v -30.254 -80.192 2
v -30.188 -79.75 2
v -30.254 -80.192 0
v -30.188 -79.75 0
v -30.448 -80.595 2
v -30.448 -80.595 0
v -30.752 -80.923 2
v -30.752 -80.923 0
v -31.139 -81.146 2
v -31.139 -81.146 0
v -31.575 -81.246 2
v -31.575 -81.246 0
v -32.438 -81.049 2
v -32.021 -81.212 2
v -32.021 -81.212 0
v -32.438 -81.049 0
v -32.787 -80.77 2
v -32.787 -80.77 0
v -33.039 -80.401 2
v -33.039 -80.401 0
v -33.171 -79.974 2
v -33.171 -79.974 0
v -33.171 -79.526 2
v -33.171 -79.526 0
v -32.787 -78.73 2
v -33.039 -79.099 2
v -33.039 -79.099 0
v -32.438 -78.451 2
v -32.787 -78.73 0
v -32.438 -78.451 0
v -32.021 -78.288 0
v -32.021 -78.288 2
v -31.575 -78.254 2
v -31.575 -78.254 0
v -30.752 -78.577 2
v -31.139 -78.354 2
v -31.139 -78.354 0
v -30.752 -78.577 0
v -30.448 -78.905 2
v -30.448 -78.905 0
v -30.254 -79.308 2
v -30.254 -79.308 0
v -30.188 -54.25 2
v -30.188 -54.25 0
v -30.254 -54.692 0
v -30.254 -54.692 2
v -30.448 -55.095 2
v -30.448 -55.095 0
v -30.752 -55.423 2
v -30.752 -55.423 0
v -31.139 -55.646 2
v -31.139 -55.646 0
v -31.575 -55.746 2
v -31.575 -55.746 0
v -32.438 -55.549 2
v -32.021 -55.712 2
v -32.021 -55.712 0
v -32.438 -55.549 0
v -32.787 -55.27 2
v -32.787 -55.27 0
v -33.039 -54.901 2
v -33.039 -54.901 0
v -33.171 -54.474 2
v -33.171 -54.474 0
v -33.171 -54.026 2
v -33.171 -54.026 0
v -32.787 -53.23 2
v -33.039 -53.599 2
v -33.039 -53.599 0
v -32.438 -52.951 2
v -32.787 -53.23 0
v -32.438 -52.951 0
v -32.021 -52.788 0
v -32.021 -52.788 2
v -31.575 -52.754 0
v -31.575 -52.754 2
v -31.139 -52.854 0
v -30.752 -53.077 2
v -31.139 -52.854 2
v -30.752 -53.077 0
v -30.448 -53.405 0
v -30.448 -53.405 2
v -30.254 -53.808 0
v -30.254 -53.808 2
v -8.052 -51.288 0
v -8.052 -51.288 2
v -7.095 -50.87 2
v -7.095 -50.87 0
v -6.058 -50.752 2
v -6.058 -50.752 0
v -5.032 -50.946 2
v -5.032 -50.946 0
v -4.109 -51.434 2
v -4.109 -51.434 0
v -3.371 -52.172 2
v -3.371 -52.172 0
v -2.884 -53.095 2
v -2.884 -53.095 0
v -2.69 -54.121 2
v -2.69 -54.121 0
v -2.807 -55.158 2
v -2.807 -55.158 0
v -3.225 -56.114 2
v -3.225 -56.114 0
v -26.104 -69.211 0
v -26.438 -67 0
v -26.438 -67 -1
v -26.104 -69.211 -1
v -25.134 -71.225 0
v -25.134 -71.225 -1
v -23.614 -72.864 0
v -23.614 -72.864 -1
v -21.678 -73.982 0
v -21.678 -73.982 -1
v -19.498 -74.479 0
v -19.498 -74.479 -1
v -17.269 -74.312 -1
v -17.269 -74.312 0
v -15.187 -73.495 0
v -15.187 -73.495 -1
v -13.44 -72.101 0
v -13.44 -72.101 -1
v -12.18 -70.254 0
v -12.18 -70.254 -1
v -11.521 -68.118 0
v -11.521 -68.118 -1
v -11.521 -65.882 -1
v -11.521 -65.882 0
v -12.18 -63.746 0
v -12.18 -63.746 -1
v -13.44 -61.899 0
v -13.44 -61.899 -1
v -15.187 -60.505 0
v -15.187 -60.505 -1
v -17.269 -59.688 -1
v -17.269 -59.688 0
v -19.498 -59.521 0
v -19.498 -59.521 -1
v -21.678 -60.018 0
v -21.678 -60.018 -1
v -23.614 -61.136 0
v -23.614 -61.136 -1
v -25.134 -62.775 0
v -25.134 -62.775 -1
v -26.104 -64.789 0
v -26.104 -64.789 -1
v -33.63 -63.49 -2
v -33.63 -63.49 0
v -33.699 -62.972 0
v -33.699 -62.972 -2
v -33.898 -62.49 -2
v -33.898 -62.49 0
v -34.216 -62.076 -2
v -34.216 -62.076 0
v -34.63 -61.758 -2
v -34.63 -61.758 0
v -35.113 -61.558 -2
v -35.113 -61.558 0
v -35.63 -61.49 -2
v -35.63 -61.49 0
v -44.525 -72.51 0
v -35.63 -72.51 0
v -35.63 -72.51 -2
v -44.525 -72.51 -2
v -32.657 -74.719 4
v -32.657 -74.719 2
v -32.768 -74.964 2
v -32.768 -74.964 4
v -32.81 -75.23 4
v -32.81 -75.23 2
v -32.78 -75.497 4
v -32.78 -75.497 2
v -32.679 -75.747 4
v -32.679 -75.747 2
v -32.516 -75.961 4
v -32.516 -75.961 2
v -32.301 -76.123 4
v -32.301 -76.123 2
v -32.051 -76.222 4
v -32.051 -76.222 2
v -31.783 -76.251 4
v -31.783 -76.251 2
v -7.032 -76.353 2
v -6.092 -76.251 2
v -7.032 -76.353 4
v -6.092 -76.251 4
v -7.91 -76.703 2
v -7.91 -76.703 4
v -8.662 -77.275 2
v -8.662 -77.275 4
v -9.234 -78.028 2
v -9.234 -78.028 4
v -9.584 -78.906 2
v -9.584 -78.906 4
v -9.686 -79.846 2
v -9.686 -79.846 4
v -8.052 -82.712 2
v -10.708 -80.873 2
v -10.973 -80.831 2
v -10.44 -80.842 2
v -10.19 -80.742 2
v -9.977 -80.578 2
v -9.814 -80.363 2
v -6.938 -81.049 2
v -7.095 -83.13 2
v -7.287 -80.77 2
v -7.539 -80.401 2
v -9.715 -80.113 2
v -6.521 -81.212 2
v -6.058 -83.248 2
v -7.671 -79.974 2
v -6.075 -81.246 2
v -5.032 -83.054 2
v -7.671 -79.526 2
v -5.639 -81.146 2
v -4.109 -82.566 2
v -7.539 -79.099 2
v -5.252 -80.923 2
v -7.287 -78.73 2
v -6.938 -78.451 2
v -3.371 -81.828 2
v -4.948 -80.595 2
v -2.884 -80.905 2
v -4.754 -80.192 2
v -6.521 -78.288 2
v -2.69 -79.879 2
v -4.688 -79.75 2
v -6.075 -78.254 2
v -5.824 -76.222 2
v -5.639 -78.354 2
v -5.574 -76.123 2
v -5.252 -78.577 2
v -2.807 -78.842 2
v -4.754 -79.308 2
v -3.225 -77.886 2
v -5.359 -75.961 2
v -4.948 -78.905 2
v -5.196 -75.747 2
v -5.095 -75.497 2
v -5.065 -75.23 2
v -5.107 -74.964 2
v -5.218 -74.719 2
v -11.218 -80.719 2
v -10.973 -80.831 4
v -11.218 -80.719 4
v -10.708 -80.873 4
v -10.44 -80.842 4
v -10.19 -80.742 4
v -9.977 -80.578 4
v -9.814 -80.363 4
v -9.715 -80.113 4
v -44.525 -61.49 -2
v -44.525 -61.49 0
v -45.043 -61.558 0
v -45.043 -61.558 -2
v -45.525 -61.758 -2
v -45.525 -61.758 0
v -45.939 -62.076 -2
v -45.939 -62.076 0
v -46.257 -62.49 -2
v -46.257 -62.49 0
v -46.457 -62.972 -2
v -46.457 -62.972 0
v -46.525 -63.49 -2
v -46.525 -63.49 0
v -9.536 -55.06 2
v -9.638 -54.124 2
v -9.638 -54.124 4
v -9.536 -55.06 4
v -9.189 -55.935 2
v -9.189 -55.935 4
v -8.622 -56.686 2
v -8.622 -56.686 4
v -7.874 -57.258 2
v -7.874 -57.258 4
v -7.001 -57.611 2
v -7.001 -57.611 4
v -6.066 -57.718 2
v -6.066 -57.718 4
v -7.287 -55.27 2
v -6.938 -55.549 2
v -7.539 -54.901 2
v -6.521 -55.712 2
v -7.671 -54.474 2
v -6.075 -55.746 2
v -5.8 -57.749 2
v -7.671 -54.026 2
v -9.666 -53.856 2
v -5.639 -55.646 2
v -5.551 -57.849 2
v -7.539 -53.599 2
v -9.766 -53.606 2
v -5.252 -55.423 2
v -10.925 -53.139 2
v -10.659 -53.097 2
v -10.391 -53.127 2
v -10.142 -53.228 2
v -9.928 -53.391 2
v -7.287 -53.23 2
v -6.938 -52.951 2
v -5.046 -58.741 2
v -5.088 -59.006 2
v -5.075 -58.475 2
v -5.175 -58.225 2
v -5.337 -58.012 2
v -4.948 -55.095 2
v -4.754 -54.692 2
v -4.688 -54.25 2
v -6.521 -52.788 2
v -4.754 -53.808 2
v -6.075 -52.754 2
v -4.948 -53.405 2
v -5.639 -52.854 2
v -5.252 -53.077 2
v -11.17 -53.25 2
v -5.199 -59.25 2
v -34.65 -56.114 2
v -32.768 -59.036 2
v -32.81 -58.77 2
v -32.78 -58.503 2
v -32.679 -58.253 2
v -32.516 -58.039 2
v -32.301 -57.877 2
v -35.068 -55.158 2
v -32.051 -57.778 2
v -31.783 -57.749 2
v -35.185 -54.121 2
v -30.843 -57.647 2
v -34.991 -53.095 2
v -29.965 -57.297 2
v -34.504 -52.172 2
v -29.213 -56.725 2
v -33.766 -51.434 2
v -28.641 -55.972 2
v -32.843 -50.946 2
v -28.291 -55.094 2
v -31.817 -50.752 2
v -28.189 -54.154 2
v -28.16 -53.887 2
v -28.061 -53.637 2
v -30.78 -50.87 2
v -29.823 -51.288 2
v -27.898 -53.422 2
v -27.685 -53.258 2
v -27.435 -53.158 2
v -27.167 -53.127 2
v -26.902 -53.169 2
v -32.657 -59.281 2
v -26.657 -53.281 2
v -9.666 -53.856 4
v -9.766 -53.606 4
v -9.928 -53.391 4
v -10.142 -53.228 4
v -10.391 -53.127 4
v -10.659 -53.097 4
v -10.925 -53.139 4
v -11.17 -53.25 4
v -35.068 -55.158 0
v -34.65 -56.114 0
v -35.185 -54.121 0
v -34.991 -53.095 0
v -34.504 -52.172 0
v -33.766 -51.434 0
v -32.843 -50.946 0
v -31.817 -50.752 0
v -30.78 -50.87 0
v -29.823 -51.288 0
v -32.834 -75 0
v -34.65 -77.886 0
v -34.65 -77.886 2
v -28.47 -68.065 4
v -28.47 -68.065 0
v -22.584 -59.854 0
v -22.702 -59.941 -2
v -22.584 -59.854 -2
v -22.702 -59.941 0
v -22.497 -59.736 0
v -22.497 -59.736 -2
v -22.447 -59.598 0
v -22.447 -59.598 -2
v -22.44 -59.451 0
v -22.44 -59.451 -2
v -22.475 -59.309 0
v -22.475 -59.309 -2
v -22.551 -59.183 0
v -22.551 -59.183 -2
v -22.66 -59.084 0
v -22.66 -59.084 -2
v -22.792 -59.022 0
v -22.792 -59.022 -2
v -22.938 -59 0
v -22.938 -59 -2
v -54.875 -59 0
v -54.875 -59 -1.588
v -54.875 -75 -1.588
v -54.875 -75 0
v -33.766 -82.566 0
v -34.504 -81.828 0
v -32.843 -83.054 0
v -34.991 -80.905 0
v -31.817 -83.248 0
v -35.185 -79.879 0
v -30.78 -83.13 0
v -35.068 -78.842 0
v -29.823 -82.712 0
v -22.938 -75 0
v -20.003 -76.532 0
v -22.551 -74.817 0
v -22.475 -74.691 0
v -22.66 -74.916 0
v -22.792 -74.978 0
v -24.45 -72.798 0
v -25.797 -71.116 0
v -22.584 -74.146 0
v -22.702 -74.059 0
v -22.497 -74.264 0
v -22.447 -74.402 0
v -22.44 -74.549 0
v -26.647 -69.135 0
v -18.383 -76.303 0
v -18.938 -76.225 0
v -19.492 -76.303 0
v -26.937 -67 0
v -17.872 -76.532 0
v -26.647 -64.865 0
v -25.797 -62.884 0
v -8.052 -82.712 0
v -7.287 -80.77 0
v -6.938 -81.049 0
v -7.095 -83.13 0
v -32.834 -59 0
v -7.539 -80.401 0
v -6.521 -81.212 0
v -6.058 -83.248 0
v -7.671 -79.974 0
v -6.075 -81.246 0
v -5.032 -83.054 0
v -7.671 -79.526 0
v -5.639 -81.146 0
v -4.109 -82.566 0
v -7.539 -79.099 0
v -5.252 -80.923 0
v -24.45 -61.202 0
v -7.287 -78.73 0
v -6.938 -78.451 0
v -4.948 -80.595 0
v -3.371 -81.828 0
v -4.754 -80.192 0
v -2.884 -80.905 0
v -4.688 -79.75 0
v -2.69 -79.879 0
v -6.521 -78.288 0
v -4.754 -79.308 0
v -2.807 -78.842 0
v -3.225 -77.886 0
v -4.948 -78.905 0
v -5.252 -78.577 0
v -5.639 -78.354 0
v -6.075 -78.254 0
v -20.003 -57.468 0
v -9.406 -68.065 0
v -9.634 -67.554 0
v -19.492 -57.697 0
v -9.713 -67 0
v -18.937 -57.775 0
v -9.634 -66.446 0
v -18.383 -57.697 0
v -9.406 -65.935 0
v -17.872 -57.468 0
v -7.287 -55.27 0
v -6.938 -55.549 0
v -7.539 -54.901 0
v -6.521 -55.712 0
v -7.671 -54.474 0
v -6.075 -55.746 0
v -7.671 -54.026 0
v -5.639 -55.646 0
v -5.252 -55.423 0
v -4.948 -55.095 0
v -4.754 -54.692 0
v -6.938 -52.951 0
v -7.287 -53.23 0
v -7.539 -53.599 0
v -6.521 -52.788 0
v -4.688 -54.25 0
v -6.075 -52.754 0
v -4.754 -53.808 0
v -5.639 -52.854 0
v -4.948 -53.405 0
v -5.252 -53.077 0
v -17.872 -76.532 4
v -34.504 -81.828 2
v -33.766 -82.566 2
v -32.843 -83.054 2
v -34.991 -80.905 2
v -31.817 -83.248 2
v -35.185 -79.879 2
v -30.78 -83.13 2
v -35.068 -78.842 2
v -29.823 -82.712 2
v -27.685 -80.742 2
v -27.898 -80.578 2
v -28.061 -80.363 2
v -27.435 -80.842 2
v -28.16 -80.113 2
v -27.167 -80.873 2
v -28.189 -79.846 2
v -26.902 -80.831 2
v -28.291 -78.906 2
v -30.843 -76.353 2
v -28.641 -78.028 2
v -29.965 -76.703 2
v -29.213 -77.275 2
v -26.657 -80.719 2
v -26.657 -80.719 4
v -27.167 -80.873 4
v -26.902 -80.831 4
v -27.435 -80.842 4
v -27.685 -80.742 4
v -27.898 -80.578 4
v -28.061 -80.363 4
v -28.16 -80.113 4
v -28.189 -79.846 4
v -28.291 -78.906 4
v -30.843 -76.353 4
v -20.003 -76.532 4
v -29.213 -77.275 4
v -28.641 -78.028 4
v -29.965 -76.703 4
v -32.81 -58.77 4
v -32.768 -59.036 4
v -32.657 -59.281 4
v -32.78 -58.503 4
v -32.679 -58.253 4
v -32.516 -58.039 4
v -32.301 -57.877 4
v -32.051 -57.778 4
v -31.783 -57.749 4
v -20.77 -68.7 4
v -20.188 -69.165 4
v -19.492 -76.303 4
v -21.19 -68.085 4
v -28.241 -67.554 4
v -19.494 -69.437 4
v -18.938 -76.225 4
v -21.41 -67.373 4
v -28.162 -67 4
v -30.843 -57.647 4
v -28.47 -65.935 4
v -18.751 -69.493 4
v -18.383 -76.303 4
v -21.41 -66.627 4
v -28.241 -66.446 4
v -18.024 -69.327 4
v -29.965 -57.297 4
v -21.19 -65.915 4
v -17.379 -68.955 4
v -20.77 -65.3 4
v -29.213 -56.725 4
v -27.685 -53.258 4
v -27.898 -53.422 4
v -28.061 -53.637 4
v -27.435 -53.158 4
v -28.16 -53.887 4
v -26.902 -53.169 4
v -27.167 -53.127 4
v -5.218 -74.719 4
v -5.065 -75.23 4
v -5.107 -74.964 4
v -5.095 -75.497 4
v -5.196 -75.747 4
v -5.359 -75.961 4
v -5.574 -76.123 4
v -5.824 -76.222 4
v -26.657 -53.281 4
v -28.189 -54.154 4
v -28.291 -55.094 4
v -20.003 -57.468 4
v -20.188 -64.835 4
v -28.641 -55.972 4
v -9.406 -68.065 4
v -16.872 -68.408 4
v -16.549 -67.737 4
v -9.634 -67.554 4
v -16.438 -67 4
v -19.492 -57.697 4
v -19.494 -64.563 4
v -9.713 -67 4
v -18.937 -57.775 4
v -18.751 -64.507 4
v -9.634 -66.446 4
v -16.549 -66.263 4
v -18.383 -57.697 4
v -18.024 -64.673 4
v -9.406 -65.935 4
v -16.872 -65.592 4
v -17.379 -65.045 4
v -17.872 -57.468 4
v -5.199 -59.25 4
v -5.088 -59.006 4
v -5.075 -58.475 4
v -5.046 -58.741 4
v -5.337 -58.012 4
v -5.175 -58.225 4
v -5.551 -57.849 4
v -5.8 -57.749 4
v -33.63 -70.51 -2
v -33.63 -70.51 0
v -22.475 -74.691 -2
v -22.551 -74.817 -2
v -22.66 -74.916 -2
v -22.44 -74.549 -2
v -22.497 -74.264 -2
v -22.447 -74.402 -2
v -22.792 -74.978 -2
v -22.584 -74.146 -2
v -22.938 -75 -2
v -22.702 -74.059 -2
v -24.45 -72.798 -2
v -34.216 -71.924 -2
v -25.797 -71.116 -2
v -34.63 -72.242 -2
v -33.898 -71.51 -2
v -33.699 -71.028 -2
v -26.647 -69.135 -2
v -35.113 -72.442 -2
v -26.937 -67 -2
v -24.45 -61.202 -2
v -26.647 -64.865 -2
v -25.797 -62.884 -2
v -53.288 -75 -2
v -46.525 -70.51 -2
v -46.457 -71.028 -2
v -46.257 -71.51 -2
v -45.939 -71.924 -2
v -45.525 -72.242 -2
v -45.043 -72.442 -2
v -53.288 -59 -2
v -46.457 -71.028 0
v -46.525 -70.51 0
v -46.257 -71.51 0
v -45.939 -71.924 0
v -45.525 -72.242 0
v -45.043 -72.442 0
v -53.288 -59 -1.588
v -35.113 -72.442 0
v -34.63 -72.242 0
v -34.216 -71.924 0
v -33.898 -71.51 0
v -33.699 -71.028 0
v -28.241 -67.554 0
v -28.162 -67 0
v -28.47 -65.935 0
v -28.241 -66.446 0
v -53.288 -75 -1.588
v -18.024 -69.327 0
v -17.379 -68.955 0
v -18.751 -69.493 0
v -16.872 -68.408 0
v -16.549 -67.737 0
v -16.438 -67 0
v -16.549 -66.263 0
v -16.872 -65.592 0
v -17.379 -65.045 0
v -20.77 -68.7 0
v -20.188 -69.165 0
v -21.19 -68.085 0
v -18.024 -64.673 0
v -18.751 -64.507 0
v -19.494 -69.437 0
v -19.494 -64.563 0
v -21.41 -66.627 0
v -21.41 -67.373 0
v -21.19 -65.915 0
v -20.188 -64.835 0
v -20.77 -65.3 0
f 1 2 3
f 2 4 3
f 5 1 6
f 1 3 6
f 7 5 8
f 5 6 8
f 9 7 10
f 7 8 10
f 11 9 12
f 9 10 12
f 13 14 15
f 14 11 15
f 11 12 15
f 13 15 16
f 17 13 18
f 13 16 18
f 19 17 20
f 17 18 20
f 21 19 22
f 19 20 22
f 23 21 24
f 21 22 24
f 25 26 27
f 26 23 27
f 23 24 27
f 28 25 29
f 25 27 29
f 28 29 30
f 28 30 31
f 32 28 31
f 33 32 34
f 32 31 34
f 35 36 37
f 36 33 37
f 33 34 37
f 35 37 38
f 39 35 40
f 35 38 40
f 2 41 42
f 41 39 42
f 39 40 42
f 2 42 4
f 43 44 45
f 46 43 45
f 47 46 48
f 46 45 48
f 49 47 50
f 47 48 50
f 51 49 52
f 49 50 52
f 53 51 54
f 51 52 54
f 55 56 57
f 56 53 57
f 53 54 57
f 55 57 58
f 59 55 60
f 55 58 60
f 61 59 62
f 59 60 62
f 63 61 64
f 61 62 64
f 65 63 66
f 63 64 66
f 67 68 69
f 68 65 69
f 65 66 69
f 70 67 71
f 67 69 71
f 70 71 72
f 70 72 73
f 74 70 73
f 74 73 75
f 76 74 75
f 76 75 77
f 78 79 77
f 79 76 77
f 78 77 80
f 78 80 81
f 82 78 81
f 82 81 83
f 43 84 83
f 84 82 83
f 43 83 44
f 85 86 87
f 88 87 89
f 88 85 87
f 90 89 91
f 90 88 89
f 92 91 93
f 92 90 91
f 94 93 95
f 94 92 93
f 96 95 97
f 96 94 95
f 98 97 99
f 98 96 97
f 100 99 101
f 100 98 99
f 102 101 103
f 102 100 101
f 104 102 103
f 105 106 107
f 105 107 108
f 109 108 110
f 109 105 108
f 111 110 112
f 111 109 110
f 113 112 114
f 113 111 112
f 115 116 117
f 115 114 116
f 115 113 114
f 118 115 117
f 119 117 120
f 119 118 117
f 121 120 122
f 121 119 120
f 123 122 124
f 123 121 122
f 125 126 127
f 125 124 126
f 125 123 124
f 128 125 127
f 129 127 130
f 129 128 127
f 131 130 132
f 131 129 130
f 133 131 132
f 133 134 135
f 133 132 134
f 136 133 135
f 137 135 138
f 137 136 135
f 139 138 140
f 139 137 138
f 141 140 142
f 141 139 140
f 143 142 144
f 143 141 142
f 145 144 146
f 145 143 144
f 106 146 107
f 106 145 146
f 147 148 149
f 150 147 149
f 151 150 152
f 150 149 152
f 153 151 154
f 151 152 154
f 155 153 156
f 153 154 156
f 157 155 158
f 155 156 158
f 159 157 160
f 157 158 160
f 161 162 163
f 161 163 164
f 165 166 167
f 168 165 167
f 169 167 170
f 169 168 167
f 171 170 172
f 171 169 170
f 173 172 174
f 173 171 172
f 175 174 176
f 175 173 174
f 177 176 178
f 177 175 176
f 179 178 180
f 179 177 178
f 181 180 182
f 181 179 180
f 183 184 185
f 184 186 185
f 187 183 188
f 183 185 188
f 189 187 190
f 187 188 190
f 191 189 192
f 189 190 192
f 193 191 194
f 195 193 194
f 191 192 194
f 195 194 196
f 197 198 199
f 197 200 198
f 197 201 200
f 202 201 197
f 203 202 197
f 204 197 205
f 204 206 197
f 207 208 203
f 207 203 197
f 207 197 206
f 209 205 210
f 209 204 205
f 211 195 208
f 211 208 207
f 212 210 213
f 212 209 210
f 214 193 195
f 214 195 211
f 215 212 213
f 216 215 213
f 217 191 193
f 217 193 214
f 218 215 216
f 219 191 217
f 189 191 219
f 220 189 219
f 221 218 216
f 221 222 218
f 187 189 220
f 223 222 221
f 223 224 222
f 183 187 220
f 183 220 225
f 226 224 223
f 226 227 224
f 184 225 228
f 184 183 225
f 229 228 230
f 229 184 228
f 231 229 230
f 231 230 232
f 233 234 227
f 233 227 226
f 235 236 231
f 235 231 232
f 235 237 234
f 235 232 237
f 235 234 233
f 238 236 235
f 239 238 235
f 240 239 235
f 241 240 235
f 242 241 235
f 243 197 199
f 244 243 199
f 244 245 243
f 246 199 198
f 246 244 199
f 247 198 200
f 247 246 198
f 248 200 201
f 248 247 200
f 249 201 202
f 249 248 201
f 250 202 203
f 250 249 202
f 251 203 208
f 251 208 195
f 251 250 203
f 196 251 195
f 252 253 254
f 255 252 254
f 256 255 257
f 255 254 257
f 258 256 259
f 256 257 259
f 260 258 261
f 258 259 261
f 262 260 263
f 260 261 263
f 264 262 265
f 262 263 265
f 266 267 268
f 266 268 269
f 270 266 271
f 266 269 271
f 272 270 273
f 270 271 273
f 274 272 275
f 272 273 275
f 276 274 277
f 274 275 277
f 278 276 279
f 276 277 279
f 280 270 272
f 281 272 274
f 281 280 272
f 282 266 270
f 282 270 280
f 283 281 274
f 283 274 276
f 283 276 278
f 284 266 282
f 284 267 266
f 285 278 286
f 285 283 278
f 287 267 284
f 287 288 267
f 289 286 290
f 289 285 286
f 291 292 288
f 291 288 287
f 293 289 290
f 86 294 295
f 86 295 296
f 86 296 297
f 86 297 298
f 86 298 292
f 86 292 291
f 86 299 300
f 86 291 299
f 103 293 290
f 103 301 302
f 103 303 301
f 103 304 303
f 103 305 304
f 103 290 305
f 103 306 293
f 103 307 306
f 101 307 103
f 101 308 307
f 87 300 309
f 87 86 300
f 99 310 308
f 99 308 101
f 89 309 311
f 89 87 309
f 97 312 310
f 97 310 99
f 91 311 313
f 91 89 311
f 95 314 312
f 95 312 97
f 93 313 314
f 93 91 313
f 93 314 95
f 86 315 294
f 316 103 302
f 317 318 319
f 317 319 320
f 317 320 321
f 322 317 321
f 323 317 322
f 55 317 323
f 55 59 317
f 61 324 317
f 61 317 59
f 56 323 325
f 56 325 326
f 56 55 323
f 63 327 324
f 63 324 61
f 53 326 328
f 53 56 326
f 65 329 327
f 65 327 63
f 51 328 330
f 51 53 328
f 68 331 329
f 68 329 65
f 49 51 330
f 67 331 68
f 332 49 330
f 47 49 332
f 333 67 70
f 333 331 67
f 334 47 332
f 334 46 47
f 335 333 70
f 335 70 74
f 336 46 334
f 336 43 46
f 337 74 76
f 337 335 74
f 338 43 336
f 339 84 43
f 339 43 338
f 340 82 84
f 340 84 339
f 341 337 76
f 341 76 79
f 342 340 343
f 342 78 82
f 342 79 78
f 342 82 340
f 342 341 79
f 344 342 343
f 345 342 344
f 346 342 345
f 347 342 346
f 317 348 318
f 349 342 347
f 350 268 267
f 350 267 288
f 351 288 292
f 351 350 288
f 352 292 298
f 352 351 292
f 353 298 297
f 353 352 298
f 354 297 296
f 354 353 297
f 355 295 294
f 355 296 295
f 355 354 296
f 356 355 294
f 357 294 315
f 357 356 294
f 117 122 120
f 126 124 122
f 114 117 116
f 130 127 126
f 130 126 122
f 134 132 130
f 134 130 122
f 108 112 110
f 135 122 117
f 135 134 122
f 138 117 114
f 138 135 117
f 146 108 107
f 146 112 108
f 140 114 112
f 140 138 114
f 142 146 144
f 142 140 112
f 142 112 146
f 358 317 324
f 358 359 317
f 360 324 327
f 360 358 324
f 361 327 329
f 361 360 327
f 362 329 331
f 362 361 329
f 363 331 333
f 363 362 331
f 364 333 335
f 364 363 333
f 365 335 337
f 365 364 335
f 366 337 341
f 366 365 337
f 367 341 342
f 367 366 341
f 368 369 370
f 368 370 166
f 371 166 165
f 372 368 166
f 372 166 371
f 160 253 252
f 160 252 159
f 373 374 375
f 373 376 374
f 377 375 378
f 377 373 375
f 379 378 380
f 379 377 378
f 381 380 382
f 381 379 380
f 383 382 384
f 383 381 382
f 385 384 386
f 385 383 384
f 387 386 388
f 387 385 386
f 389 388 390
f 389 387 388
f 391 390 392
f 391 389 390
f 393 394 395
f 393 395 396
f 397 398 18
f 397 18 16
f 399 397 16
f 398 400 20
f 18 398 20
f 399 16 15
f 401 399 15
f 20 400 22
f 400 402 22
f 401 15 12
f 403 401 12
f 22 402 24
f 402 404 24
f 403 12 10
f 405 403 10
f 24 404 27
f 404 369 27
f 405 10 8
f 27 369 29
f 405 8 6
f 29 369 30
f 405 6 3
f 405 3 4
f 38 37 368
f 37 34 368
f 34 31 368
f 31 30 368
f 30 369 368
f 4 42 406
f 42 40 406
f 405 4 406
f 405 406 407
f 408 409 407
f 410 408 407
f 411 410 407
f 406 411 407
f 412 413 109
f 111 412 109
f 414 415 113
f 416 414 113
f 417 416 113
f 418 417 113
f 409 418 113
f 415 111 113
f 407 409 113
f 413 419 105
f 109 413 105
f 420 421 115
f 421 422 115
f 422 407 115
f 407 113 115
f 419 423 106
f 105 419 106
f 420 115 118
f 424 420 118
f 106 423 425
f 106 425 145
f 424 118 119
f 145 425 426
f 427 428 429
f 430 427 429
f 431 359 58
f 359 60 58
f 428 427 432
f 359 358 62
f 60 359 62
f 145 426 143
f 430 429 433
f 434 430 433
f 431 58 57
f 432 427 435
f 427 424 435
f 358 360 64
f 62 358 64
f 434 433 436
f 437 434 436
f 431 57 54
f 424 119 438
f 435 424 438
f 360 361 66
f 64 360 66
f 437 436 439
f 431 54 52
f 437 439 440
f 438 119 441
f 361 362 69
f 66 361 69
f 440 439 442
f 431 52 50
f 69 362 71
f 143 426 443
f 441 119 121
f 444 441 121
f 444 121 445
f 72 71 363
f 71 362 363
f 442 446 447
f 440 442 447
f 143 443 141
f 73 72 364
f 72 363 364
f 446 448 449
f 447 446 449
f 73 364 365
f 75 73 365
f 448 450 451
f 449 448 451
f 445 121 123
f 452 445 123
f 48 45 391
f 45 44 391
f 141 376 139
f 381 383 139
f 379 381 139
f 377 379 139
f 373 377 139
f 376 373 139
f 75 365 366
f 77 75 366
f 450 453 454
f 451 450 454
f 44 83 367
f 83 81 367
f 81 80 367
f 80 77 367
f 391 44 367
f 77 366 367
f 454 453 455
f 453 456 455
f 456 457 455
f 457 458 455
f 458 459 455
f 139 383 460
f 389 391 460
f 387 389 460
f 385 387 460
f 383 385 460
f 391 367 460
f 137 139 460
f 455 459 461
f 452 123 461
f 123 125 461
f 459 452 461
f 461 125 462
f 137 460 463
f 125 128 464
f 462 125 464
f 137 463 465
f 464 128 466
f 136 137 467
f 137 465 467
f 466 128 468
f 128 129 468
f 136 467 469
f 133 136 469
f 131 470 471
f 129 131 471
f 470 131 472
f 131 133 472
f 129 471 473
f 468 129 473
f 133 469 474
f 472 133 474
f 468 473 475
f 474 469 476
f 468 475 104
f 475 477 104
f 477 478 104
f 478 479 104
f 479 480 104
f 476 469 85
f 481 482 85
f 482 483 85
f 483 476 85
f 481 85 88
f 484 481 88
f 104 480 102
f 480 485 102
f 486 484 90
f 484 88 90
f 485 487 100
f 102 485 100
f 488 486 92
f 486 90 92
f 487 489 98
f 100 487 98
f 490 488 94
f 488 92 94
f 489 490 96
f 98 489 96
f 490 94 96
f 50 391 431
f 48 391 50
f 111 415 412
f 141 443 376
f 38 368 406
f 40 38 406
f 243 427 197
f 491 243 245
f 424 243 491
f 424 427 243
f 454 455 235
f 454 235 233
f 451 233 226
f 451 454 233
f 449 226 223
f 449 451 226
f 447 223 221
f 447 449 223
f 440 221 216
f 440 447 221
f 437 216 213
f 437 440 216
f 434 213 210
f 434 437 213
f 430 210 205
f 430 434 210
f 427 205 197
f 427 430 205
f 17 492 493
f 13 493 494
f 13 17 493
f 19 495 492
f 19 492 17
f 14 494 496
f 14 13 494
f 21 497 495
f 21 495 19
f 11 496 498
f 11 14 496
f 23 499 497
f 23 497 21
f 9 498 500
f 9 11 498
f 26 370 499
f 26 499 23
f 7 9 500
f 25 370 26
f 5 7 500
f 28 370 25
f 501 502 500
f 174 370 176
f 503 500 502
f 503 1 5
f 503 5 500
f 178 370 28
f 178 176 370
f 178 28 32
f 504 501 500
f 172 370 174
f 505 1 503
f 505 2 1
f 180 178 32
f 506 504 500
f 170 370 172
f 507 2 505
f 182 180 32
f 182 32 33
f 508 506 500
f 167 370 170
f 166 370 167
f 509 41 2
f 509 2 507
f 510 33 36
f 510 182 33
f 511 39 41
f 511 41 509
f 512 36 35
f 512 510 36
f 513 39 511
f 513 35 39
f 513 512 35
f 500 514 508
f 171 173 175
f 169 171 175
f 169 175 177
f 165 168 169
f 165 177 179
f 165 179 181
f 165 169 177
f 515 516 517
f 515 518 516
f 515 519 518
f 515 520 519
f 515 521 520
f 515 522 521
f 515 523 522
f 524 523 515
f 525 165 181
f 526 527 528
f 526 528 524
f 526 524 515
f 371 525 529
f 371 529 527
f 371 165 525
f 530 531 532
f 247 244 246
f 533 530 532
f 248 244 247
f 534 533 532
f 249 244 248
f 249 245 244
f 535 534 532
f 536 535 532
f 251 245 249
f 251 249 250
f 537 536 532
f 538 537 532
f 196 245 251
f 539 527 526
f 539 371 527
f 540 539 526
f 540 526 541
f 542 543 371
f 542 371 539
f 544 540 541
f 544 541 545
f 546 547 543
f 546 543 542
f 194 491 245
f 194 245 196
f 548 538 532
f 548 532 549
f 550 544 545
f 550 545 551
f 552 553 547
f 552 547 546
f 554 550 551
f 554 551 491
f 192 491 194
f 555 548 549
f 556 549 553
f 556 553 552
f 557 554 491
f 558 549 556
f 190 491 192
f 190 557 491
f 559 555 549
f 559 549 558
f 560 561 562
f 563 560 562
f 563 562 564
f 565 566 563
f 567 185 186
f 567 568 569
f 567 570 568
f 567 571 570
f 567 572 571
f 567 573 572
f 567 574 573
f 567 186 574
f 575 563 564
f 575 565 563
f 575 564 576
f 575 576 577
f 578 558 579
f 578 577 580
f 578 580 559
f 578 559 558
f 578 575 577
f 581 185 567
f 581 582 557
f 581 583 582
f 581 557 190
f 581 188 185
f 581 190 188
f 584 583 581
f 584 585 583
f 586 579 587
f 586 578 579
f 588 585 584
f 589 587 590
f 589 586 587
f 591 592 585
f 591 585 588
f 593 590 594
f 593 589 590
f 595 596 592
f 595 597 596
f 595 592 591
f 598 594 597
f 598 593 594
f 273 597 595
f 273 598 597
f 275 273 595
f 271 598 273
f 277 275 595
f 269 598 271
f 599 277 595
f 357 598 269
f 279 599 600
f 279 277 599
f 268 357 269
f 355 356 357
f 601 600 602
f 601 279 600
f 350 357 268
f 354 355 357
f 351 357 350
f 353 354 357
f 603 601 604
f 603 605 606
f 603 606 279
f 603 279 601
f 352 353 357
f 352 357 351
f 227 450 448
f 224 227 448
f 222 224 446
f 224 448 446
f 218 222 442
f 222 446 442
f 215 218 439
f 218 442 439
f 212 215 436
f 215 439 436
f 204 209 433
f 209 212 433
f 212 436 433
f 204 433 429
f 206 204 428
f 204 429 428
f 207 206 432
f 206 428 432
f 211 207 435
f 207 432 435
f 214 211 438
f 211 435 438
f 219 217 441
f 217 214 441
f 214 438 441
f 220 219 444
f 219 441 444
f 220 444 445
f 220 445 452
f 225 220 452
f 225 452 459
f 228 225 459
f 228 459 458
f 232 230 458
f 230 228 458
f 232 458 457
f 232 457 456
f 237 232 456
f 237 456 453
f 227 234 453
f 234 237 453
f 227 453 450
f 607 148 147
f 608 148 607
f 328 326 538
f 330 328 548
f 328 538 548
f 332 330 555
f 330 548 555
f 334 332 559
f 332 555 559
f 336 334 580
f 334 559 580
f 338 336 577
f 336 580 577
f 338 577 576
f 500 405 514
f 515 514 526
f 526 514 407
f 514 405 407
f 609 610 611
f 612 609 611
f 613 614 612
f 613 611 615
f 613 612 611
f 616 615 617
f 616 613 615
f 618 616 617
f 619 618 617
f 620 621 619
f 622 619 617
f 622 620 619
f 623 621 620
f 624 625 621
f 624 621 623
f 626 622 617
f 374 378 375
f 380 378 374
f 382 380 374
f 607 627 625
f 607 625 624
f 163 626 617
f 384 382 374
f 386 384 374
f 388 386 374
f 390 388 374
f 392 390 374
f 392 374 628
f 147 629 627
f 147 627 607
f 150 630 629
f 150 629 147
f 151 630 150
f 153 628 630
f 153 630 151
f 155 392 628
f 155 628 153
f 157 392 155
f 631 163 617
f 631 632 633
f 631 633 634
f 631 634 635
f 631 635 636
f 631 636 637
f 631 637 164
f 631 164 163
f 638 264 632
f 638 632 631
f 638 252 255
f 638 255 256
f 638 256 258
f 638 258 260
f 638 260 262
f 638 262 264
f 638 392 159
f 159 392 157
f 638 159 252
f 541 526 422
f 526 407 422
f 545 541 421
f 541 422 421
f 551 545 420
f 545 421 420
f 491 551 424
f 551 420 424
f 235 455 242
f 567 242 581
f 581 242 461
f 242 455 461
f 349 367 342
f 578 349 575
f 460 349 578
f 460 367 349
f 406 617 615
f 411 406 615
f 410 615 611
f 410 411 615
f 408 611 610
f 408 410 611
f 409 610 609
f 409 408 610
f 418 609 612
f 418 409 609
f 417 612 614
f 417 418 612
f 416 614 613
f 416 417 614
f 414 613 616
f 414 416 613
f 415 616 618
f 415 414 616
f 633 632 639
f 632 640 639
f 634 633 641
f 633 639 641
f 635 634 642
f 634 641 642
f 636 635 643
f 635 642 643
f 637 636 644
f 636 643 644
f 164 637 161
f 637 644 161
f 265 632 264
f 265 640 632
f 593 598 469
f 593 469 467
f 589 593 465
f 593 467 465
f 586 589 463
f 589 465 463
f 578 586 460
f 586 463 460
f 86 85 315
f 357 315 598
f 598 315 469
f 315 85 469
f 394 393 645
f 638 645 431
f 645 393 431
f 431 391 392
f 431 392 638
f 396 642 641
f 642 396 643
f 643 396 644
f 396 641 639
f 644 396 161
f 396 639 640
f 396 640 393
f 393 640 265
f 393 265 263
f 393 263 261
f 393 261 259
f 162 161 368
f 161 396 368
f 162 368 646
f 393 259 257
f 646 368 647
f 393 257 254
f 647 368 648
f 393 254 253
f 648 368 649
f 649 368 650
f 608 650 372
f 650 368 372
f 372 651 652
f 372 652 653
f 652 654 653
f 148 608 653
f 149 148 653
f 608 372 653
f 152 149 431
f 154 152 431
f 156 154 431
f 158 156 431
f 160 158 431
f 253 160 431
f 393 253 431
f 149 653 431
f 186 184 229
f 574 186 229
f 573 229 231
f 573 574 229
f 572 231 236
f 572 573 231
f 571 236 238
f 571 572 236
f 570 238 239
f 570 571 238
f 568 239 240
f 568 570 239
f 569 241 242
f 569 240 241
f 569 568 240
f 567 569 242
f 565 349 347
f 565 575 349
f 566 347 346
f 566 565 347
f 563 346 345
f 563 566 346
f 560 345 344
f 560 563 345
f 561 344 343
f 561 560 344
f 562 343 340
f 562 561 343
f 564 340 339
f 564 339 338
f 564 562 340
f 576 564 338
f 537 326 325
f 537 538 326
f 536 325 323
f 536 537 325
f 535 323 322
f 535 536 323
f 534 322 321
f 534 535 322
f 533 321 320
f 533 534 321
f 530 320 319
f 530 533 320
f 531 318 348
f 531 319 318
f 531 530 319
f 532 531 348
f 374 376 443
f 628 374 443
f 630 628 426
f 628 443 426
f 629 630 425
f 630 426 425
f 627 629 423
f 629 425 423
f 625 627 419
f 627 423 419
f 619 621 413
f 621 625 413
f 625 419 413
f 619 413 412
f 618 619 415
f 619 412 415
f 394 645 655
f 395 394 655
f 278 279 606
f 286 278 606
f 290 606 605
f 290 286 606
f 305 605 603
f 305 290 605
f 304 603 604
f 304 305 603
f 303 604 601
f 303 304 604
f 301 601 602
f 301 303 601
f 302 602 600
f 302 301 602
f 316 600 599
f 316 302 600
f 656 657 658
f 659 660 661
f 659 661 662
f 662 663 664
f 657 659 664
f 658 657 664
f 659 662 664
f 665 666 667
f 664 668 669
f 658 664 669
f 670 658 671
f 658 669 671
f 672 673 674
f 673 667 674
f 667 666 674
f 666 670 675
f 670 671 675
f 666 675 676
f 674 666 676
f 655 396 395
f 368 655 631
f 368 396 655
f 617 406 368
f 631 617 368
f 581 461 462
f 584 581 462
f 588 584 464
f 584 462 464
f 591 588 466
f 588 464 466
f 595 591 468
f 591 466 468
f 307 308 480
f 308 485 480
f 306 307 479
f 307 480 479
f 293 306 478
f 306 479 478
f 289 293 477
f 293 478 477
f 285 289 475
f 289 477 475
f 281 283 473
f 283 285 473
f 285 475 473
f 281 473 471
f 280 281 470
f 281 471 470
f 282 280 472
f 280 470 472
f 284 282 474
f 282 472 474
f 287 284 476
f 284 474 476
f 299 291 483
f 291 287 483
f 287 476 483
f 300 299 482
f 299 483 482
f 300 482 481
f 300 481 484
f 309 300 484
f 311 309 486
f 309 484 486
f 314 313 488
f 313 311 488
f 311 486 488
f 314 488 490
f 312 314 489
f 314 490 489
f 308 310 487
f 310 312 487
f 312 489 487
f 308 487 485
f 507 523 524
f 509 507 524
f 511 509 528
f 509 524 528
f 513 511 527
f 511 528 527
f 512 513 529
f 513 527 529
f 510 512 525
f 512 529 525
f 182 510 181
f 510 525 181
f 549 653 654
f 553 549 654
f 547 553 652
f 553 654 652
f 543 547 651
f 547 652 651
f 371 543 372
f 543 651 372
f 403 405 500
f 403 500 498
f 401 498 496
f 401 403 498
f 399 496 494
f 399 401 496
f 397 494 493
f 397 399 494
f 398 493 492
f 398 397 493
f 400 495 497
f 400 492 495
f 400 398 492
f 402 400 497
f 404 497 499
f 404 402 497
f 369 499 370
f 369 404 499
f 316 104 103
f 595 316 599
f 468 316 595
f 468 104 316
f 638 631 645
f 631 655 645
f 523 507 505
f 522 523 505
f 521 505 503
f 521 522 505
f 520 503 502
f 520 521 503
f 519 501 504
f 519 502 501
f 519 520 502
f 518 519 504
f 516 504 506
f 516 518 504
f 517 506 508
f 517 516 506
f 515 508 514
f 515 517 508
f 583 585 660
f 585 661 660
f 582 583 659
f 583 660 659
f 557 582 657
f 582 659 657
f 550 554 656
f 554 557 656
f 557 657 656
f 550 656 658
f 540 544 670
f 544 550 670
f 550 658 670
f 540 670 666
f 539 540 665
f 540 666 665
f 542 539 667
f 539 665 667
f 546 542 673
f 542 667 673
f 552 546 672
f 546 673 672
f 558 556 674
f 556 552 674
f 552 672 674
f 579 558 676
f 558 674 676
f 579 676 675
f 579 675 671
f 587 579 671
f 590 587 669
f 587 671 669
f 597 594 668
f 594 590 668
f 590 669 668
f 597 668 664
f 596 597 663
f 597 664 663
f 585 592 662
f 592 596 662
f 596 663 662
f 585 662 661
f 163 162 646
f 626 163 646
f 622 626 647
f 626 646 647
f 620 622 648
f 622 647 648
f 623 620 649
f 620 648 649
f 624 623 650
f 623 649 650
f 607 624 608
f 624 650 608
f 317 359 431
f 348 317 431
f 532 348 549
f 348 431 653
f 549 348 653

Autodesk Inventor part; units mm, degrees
ref_plane "YZ Plane" through (0, 0, 0) normal (1, 0, 0) x (0, 1, 0)
ref_plane "XZ Plane" through (0, 0, 0) normal (0, 1, 0) x (-1, 0, 0)
sketch "Sketch1" plane through (0, 0, 0) normal (0, 0, 1) x (1, 0, 0)
  line L0 (-1.5875, 0) -> (-1.5875, -108.1) projected
  line L1 (-54.875, 0) -> (-1.5875, 0) projected
  line L2 (-54.875, 0) -> (-54.875, -59) projected
  line L3 (-54.875, -59) -> (-18.9375, -59) projected
  arc A0 (-18.9375, -75) -> (-18.9375, -59) centre (-18.9375, -67) ccw projected
  line L4 (-18.9375, -75) -> (-54.875, -75) projected
  line L5 (-54.875, -75) -> (-54.875, -108.1) projected
  line L6 (-54.875, -108.1) -> (-1.5875, -108.1) projected
  circle A1 centre (-18.9375, -67) radius 2 projected
  circle A2 centre (-18.9375, -67) radius 2 projected
  circle A3 centre (-18.9375, -67) radius 7.5 projected
  line L7 (-6.1875, -79.75) -> (-31.6875, -79.75) construction
  line L8 (-31.6875, -79.75) -> (-31.6875, -54.25) construction
  line L9 (-31.6875, -54.25) -> (-6.1875, -54.25) construction
  line L10 (-6.1875, -54.25) -> (-6.1875, -79.75) construction
  line L11 (-18.9375, -79.75) -> (-18.9375, -54.25) construction
  line L12 (-31.6875, -67) -> (-6.1875, -67) construction
  circle A4 centre (-6.1875, -79.75) radius 1.5
  circle A5 centre (-31.6875, -79.75) radius 1.5
  circle A6 centre (-31.6875, -54.25) radius 1.5
  circle A7 centre (-6.1875, -54.25) radius 1.5
  circle A8 centre (-6.1875, -79.75) radius 2.6 construction
  circle A9 centre (-31.6875, -79.75) radius 2.6 construction
  circle A10 centre (-31.6875, -54.25) radius 2.6 construction
  circle A11 centre (-6.1875, -54.25) radius 2.6 construction
  line L13 (-3.5875, -79.75) -> (-3.5875, -54.25) construction
  arc A12 (-8.0517, -82.7122) -> (-3.5875, -77.4069) centre (-6.1875, -79.75) ccw
  arc A13 (-34.6497, -77.8858) -> (-29.8233, -82.7122) centre (-31.6875, -79.75) ccw
  arc A14 (-29.8233, -51.2878) -> (-34.6497, -56.1142) centre (-31.6875, -54.25) ccw
  arc A15 (-3.5875, -56.5931) -> (-8.0517, -51.2878) centre (-6.1875, -54.25) ccw
  line L14 (-8.0517, -82.7122) -> (-17.8722, -76.532)
  line L15 (-34.6497, -56.1142) -> (-28.4695, -65.9347)
  line L16 (-34.6497, -77.8858) -> (-28.4695, -68.0653)
  line L17 (-3.2253, -56.1142) -> (-9.4055, -65.9347)
  line L18 (-3.2253, -77.8858) -> (-9.4055, -68.0653)
  line L19 (-29.8233, -51.2878) -> (-20.0028, -57.468)
  line L20 (-8.0517, -51.2878) -> (-17.8722, -57.468)
  line L21 (-20.3773, -59) -> (-20.6867, -59.1936)
  line L22 (-29.8233, -82.7122) -> (-20.0028, -76.532)
  arc A16 (-20.0028, -57.468) -> (-17.8722, -57.468) centre (-18.9375, -55.7753) ccw
  arc A17 (-28.4695, -68.0653) -> (-28.4695, -65.9347) centre (-30.1622, -67) ccw
  arc A18 (-17.8722, -76.532) -> (-20.0028, -76.532) centre (-18.9375, -78.2247) ccw
  arc A19 (-9.4055, -65.9347) -> (-9.4055, -68.0653) centre (-7.7128, -67) ccw
  circle A20 centre (-18.9375, -67) radius 2.5
  circle A21 centre (-31.6875, -54.25) radius 2.6 projected
  circle A22 centre (-6.1875, -79.75) radius 2.6 projected
  circle A23 centre (-6.1875, -54.25) radius 2.6 projected
  circle A24 centre (-31.6875, -79.75) radius 2.6 projected
  point P0 (0, 0)
  point P1 (-27.7991, -67)
  point P2 (-10.0759, -67)
  point P3 (-18.9375, -58.1384)
  point P4 (-18.9375, -75.8616)
  dimension "d2" = 5.2
  dimension "d1" = 3
  dimension "d4" = 2
  dimension "d5" = 2
  dimension "d6" = 2
  dimension "d9" = 0.5
extrude "Extrusion1" add sketch "Sketch1" along normal blind 4 contours L15 A14 L19 A16 L20 A15 L17 A19 L18 A12 L14 A18 L22 A13 L16 L4 A0 L3 | L3 A0 L4 L16 A17 L15 | A3 | A21 | A22 | A23 | A24
sketch "Sketch2" plane through (0, 0, 0) normal (0, 0, -1) x (-1, 0, 0)
  circle A0 centre (18.9375, -67) radius 7.5 projected
  point P0 (0, 0)
extrude "Extrusion2" add sketch "Sketch2" along normal blind 1
sketch "Sketch3" plane through (0, 0, 0) normal (0, 0, -1) x (-1, 0, 0)
  line L0 (1.5875, 0) -> (1.5875, -108.1) projected
  line L1 (54.875, 0) -> (1.5875, 0) projected
  line L2 (54.875, 0) -> (54.875, -59) projected
  line L3 (54.875, -59) -> (18.9375, -59) projected
  arc A0 (18.9375, -59) -> (18.9375, -75) centre (18.9375, -67) ccw projected
  line L4 (18.9375, -75) -> (54.875, -75) projected
  line L5 (54.875, -75) -> (54.875, -108.1) projected
  line L6 (54.875, -108.1) -> (1.5875, -108.1) projected
  circle A1 centre (18.9375, -67) radius 7.5 projected
  arc A2 (18.9375, -59) -> (18.9375, -75) centre (18.9375, -67) ccw projected
  circle A3 centre (18.9375, -67) radius 2.5 projected
  arc A4 (22.7022, -74.0588) -> (22.7022, -59.9412) centre (18.9375, -67) ccw
  line L7 (53.2875, -108.1) -> (53.2875, 0) projected
  line L8 (54.875, 0) -> (54.875, -108.1) projected
  line L9 (53.2875, -59) -> (22.9375, -59)
  line L10 (18.9375, -59) -> (18.9375, -75)
  line L11 (22.9375, -75) -> (53.2875, -75)
  line L12 (53.2875, -75) -> (53.2875, -59)
  arc A5 (22.9375, -59) -> (22.7022, -59.9412) centre (22.9375, -59.5) ccw
  arc A6 (22.7022, -74.0588) -> (22.9375, -75) centre (22.9375, -74.5) ccw
  circle A7 centre (31.6875, -54.25) radius 2.6 projected
  circle A8 centre (6.1875, -79.75) radius 2.6 projected
  circle A9 centre (6.1875, -54.25) radius 2.6 projected
  circle A10 centre (31.6875, -79.75) radius 2.6 projected
  point P0 (0, 0)
  dimension "d12" = 0.5
extrude "Extrusion3" add sketch "Sketch3" along normal blind 2 contours L7 L4 A6 A4 A5 L3
sketch "Sketch4" plane through (-53.2875, -75, 0) normal (-1, 0, 0) x (0, 0, 1)
  line L0 (-1.5875, 75) -> (-1.5875, -33.1) projected
  line L1 (0, -33.1) -> (0, 75) projected
  line L2 (0, 15.0588) -> (0, 16) projected
  line L3 (0, 0) -> (-2, 0) projected
  line L4 (0, 16) -> (-1.5875, 16)
  line L5 (-1.5875, 16) -> (-1.5875, 0)
  line L6 (-1.5875, 0) -> (0, 0)
  line L7 (0, 0) -> (0, 16)
ref_plane "Work Plane1" through (-54.875, -108.1, -1.5875) normal (1, 0, 0) x (0, 1, 0)
extrude "Extrusion4" add sketch "Sketch4" along normal up to surface (1.5875 mm away)
sketch "Sketch5" plane through (0, 0, 4) normal (0, 0, 1) x (1, 0, 0)
  arc A0 (-28.4695, -68.0653) -> (-28.4695, -65.9347) centre (-30.1622, -67) ccw projected
  line L0 (-28.4695, -68.0653) -> (-34.6497, -77.8858) projected
  arc A1 (-34.6497, -77.8858) -> (-29.8233, -82.7122) centre (-31.6875, -79.75) ccw projected
  line L1 (-29.8233, -82.7122) -> (-20.0028, -76.532) projected
  arc A2 (-17.8722, -76.532) -> (-20.0028, -76.532) centre (-18.9375, -78.2247) ccw projected
  line L2 (-17.8722, -76.532) -> (-8.0517, -82.7122) projected
  arc A3 (-8.0517, -82.7122) -> (-3.2253, -77.8858) centre (-6.1875, -79.75) ccw projected
  line L3 (-3.2253, -77.8858) -> (-9.4055, -68.0653) projected
  arc A4 (-9.4055, -65.9347) -> (-9.4055, -68.0653) centre (-7.7128, -67) ccw projected
  line L4 (-9.4055, -65.9347) -> (-3.2253, -56.1142) projected
  arc A5 (-3.2253, -56.1142) -> (-8.0517, -51.2878) centre (-6.1875, -54.25) ccw projected
  line L5 (-8.0517, -51.2878) -> (-17.8722, -57.468) projected
  arc A6 (-20.0028, -57.468) -> (-17.8722, -57.468) centre (-18.9375, -55.7753) ccw projected
  line L6 (-20.0028, -57.468) -> (-29.8233, -51.2878) projected
  arc A7 (-29.8233, -51.2878) -> (-34.6497, -56.1142) centre (-31.6875, -54.25) ccw projected
  line L7 (-34.6497, -56.1142) -> (-28.4695, -65.9347) projected
  circle A8 centre (-18.9375, -67) radius 2.5 projected
  circle A9 centre (-6.1875, -54.25) radius 1.5 projected
  circle A10 centre (-31.6875, -54.25) radius 1.5 projected
  circle A11 centre (-31.6875, -79.75) radius 1.5 projected
  circle A12 centre (-6.1875, -79.75) radius 1.5 projected
  circle A13 centre (-31.6875, -79.75) radius 3.5
  circle A14 centre (-31.6875, -54.25) radius 1.5 projected
  circle A15 centre (-31.6875, -54.25) radius 3.5
  circle A16 centre (-6.1875, -79.75) radius 3.5
  arc A17 (-3.2253, -56.1142) -> (-8.0517, -51.2878) centre (-6.1875, -54.25) ccw projected
  circle A18 centre (-6.1388, -54.2188) radius 3.5
  point P0 (0, 0)
  point P1 (-34.6497, -56.1142)
  point P2 (-29.8233, -51.2878)
  point P3 (-2.2565, -55.1629)
  point P4 (-3.2253, -77.8858)
  point P5 (-8.0517, -82.7122)
  point P6 (-29.8233, -82.7122)
  point P7 (-3.4179, -56.4203)
extrude "Extrusion5" cut sketch "Sketch5" against normal blind 2 contours A13 A1 | A7 A15 | A16 A3 | A5 L4 A18 picked at (-4.1737, -56.2279)
fillet "Fillet1" radius 1 10 edges at (-8.0517, -82.7122, 3) (-3.2253, -77.8858, 3) (-3.2253, -56.1142, 1) (-8.0517, -51.2878, 1) (-29.8233, -51.2878, 3) (-34.6497, -56.1142, 3) (-34.6497, -77.8858, 3) (-29.8233, -82.7122, 3) (-3.4179, -56.4203, 3) (-8.0517, -51.2878, 3)
sketch "Sketch6" plane through (0, 0, 0) normal (0, 0, 1) x (1, 0, 0)
  line L0 (-32.8336, -59) -> (-28.4695, -65.9347) projected
  line L1 (-32.8336, -59) -> (-54.875, -59) projected
  line L2 (-54.875, -75) -> (-54.875, -59) projected
  line L3 (-32.8336, -75) -> (-54.875, -75) projected
  line L4 (-28.4695, -68.0653) -> (-32.8336, -75) projected
  arc A0 (-28.4695, -68.0653) -> (-28.4695, -65.9347) centre (-30.1622, -67) ccw projected
  line L5 (-53.2875, 0) -> (-53.2875, -108.1) projected
  line L6 (-35.6304, -72.5101) -> (-44.525, -72.5101)
  line L7 (-46.525, -70.5101) -> (-46.525, -63.4899)
  line L8 (-44.525, -61.4899) -> (-35.6304, -61.4899)
  line L9 (-33.6304, -63.4899) -> (-33.6304, -70.5101)
  line L10 (-28.1622, -67) -> (-54.875, -67) construction
  line L11 (-54.875, -59) -> (-54.875, -75) construction
  line L12 (-48.525, -39.75) -> (-48.525, -93.75) construction
  arc A1 (-35.6304, -72.5101) -> (-33.6304, -70.5101) centre (-35.6304, -70.5101) ccw
  arc A2 (-46.525, -70.5101) -> (-44.525, -72.5101) centre (-44.525, -70.5101) ccw
  arc A3 (-44.525, -61.4899) -> (-46.525, -63.4899) centre (-44.525, -63.4899) ccw
  arc A4 (-33.6304, -63.4899) -> (-35.6304, -61.4899) centre (-35.6304, -63.4899) ccw
  point P0 (0, 0)
  dimension "d20" = 2
  dimension "d21" = 2
extrude "Extrusion6" cut sketch "Sketch6" against normal through all contours L6 A2 L7 A3 L8 A4 L9 A1
properties part number "TurretBase"
